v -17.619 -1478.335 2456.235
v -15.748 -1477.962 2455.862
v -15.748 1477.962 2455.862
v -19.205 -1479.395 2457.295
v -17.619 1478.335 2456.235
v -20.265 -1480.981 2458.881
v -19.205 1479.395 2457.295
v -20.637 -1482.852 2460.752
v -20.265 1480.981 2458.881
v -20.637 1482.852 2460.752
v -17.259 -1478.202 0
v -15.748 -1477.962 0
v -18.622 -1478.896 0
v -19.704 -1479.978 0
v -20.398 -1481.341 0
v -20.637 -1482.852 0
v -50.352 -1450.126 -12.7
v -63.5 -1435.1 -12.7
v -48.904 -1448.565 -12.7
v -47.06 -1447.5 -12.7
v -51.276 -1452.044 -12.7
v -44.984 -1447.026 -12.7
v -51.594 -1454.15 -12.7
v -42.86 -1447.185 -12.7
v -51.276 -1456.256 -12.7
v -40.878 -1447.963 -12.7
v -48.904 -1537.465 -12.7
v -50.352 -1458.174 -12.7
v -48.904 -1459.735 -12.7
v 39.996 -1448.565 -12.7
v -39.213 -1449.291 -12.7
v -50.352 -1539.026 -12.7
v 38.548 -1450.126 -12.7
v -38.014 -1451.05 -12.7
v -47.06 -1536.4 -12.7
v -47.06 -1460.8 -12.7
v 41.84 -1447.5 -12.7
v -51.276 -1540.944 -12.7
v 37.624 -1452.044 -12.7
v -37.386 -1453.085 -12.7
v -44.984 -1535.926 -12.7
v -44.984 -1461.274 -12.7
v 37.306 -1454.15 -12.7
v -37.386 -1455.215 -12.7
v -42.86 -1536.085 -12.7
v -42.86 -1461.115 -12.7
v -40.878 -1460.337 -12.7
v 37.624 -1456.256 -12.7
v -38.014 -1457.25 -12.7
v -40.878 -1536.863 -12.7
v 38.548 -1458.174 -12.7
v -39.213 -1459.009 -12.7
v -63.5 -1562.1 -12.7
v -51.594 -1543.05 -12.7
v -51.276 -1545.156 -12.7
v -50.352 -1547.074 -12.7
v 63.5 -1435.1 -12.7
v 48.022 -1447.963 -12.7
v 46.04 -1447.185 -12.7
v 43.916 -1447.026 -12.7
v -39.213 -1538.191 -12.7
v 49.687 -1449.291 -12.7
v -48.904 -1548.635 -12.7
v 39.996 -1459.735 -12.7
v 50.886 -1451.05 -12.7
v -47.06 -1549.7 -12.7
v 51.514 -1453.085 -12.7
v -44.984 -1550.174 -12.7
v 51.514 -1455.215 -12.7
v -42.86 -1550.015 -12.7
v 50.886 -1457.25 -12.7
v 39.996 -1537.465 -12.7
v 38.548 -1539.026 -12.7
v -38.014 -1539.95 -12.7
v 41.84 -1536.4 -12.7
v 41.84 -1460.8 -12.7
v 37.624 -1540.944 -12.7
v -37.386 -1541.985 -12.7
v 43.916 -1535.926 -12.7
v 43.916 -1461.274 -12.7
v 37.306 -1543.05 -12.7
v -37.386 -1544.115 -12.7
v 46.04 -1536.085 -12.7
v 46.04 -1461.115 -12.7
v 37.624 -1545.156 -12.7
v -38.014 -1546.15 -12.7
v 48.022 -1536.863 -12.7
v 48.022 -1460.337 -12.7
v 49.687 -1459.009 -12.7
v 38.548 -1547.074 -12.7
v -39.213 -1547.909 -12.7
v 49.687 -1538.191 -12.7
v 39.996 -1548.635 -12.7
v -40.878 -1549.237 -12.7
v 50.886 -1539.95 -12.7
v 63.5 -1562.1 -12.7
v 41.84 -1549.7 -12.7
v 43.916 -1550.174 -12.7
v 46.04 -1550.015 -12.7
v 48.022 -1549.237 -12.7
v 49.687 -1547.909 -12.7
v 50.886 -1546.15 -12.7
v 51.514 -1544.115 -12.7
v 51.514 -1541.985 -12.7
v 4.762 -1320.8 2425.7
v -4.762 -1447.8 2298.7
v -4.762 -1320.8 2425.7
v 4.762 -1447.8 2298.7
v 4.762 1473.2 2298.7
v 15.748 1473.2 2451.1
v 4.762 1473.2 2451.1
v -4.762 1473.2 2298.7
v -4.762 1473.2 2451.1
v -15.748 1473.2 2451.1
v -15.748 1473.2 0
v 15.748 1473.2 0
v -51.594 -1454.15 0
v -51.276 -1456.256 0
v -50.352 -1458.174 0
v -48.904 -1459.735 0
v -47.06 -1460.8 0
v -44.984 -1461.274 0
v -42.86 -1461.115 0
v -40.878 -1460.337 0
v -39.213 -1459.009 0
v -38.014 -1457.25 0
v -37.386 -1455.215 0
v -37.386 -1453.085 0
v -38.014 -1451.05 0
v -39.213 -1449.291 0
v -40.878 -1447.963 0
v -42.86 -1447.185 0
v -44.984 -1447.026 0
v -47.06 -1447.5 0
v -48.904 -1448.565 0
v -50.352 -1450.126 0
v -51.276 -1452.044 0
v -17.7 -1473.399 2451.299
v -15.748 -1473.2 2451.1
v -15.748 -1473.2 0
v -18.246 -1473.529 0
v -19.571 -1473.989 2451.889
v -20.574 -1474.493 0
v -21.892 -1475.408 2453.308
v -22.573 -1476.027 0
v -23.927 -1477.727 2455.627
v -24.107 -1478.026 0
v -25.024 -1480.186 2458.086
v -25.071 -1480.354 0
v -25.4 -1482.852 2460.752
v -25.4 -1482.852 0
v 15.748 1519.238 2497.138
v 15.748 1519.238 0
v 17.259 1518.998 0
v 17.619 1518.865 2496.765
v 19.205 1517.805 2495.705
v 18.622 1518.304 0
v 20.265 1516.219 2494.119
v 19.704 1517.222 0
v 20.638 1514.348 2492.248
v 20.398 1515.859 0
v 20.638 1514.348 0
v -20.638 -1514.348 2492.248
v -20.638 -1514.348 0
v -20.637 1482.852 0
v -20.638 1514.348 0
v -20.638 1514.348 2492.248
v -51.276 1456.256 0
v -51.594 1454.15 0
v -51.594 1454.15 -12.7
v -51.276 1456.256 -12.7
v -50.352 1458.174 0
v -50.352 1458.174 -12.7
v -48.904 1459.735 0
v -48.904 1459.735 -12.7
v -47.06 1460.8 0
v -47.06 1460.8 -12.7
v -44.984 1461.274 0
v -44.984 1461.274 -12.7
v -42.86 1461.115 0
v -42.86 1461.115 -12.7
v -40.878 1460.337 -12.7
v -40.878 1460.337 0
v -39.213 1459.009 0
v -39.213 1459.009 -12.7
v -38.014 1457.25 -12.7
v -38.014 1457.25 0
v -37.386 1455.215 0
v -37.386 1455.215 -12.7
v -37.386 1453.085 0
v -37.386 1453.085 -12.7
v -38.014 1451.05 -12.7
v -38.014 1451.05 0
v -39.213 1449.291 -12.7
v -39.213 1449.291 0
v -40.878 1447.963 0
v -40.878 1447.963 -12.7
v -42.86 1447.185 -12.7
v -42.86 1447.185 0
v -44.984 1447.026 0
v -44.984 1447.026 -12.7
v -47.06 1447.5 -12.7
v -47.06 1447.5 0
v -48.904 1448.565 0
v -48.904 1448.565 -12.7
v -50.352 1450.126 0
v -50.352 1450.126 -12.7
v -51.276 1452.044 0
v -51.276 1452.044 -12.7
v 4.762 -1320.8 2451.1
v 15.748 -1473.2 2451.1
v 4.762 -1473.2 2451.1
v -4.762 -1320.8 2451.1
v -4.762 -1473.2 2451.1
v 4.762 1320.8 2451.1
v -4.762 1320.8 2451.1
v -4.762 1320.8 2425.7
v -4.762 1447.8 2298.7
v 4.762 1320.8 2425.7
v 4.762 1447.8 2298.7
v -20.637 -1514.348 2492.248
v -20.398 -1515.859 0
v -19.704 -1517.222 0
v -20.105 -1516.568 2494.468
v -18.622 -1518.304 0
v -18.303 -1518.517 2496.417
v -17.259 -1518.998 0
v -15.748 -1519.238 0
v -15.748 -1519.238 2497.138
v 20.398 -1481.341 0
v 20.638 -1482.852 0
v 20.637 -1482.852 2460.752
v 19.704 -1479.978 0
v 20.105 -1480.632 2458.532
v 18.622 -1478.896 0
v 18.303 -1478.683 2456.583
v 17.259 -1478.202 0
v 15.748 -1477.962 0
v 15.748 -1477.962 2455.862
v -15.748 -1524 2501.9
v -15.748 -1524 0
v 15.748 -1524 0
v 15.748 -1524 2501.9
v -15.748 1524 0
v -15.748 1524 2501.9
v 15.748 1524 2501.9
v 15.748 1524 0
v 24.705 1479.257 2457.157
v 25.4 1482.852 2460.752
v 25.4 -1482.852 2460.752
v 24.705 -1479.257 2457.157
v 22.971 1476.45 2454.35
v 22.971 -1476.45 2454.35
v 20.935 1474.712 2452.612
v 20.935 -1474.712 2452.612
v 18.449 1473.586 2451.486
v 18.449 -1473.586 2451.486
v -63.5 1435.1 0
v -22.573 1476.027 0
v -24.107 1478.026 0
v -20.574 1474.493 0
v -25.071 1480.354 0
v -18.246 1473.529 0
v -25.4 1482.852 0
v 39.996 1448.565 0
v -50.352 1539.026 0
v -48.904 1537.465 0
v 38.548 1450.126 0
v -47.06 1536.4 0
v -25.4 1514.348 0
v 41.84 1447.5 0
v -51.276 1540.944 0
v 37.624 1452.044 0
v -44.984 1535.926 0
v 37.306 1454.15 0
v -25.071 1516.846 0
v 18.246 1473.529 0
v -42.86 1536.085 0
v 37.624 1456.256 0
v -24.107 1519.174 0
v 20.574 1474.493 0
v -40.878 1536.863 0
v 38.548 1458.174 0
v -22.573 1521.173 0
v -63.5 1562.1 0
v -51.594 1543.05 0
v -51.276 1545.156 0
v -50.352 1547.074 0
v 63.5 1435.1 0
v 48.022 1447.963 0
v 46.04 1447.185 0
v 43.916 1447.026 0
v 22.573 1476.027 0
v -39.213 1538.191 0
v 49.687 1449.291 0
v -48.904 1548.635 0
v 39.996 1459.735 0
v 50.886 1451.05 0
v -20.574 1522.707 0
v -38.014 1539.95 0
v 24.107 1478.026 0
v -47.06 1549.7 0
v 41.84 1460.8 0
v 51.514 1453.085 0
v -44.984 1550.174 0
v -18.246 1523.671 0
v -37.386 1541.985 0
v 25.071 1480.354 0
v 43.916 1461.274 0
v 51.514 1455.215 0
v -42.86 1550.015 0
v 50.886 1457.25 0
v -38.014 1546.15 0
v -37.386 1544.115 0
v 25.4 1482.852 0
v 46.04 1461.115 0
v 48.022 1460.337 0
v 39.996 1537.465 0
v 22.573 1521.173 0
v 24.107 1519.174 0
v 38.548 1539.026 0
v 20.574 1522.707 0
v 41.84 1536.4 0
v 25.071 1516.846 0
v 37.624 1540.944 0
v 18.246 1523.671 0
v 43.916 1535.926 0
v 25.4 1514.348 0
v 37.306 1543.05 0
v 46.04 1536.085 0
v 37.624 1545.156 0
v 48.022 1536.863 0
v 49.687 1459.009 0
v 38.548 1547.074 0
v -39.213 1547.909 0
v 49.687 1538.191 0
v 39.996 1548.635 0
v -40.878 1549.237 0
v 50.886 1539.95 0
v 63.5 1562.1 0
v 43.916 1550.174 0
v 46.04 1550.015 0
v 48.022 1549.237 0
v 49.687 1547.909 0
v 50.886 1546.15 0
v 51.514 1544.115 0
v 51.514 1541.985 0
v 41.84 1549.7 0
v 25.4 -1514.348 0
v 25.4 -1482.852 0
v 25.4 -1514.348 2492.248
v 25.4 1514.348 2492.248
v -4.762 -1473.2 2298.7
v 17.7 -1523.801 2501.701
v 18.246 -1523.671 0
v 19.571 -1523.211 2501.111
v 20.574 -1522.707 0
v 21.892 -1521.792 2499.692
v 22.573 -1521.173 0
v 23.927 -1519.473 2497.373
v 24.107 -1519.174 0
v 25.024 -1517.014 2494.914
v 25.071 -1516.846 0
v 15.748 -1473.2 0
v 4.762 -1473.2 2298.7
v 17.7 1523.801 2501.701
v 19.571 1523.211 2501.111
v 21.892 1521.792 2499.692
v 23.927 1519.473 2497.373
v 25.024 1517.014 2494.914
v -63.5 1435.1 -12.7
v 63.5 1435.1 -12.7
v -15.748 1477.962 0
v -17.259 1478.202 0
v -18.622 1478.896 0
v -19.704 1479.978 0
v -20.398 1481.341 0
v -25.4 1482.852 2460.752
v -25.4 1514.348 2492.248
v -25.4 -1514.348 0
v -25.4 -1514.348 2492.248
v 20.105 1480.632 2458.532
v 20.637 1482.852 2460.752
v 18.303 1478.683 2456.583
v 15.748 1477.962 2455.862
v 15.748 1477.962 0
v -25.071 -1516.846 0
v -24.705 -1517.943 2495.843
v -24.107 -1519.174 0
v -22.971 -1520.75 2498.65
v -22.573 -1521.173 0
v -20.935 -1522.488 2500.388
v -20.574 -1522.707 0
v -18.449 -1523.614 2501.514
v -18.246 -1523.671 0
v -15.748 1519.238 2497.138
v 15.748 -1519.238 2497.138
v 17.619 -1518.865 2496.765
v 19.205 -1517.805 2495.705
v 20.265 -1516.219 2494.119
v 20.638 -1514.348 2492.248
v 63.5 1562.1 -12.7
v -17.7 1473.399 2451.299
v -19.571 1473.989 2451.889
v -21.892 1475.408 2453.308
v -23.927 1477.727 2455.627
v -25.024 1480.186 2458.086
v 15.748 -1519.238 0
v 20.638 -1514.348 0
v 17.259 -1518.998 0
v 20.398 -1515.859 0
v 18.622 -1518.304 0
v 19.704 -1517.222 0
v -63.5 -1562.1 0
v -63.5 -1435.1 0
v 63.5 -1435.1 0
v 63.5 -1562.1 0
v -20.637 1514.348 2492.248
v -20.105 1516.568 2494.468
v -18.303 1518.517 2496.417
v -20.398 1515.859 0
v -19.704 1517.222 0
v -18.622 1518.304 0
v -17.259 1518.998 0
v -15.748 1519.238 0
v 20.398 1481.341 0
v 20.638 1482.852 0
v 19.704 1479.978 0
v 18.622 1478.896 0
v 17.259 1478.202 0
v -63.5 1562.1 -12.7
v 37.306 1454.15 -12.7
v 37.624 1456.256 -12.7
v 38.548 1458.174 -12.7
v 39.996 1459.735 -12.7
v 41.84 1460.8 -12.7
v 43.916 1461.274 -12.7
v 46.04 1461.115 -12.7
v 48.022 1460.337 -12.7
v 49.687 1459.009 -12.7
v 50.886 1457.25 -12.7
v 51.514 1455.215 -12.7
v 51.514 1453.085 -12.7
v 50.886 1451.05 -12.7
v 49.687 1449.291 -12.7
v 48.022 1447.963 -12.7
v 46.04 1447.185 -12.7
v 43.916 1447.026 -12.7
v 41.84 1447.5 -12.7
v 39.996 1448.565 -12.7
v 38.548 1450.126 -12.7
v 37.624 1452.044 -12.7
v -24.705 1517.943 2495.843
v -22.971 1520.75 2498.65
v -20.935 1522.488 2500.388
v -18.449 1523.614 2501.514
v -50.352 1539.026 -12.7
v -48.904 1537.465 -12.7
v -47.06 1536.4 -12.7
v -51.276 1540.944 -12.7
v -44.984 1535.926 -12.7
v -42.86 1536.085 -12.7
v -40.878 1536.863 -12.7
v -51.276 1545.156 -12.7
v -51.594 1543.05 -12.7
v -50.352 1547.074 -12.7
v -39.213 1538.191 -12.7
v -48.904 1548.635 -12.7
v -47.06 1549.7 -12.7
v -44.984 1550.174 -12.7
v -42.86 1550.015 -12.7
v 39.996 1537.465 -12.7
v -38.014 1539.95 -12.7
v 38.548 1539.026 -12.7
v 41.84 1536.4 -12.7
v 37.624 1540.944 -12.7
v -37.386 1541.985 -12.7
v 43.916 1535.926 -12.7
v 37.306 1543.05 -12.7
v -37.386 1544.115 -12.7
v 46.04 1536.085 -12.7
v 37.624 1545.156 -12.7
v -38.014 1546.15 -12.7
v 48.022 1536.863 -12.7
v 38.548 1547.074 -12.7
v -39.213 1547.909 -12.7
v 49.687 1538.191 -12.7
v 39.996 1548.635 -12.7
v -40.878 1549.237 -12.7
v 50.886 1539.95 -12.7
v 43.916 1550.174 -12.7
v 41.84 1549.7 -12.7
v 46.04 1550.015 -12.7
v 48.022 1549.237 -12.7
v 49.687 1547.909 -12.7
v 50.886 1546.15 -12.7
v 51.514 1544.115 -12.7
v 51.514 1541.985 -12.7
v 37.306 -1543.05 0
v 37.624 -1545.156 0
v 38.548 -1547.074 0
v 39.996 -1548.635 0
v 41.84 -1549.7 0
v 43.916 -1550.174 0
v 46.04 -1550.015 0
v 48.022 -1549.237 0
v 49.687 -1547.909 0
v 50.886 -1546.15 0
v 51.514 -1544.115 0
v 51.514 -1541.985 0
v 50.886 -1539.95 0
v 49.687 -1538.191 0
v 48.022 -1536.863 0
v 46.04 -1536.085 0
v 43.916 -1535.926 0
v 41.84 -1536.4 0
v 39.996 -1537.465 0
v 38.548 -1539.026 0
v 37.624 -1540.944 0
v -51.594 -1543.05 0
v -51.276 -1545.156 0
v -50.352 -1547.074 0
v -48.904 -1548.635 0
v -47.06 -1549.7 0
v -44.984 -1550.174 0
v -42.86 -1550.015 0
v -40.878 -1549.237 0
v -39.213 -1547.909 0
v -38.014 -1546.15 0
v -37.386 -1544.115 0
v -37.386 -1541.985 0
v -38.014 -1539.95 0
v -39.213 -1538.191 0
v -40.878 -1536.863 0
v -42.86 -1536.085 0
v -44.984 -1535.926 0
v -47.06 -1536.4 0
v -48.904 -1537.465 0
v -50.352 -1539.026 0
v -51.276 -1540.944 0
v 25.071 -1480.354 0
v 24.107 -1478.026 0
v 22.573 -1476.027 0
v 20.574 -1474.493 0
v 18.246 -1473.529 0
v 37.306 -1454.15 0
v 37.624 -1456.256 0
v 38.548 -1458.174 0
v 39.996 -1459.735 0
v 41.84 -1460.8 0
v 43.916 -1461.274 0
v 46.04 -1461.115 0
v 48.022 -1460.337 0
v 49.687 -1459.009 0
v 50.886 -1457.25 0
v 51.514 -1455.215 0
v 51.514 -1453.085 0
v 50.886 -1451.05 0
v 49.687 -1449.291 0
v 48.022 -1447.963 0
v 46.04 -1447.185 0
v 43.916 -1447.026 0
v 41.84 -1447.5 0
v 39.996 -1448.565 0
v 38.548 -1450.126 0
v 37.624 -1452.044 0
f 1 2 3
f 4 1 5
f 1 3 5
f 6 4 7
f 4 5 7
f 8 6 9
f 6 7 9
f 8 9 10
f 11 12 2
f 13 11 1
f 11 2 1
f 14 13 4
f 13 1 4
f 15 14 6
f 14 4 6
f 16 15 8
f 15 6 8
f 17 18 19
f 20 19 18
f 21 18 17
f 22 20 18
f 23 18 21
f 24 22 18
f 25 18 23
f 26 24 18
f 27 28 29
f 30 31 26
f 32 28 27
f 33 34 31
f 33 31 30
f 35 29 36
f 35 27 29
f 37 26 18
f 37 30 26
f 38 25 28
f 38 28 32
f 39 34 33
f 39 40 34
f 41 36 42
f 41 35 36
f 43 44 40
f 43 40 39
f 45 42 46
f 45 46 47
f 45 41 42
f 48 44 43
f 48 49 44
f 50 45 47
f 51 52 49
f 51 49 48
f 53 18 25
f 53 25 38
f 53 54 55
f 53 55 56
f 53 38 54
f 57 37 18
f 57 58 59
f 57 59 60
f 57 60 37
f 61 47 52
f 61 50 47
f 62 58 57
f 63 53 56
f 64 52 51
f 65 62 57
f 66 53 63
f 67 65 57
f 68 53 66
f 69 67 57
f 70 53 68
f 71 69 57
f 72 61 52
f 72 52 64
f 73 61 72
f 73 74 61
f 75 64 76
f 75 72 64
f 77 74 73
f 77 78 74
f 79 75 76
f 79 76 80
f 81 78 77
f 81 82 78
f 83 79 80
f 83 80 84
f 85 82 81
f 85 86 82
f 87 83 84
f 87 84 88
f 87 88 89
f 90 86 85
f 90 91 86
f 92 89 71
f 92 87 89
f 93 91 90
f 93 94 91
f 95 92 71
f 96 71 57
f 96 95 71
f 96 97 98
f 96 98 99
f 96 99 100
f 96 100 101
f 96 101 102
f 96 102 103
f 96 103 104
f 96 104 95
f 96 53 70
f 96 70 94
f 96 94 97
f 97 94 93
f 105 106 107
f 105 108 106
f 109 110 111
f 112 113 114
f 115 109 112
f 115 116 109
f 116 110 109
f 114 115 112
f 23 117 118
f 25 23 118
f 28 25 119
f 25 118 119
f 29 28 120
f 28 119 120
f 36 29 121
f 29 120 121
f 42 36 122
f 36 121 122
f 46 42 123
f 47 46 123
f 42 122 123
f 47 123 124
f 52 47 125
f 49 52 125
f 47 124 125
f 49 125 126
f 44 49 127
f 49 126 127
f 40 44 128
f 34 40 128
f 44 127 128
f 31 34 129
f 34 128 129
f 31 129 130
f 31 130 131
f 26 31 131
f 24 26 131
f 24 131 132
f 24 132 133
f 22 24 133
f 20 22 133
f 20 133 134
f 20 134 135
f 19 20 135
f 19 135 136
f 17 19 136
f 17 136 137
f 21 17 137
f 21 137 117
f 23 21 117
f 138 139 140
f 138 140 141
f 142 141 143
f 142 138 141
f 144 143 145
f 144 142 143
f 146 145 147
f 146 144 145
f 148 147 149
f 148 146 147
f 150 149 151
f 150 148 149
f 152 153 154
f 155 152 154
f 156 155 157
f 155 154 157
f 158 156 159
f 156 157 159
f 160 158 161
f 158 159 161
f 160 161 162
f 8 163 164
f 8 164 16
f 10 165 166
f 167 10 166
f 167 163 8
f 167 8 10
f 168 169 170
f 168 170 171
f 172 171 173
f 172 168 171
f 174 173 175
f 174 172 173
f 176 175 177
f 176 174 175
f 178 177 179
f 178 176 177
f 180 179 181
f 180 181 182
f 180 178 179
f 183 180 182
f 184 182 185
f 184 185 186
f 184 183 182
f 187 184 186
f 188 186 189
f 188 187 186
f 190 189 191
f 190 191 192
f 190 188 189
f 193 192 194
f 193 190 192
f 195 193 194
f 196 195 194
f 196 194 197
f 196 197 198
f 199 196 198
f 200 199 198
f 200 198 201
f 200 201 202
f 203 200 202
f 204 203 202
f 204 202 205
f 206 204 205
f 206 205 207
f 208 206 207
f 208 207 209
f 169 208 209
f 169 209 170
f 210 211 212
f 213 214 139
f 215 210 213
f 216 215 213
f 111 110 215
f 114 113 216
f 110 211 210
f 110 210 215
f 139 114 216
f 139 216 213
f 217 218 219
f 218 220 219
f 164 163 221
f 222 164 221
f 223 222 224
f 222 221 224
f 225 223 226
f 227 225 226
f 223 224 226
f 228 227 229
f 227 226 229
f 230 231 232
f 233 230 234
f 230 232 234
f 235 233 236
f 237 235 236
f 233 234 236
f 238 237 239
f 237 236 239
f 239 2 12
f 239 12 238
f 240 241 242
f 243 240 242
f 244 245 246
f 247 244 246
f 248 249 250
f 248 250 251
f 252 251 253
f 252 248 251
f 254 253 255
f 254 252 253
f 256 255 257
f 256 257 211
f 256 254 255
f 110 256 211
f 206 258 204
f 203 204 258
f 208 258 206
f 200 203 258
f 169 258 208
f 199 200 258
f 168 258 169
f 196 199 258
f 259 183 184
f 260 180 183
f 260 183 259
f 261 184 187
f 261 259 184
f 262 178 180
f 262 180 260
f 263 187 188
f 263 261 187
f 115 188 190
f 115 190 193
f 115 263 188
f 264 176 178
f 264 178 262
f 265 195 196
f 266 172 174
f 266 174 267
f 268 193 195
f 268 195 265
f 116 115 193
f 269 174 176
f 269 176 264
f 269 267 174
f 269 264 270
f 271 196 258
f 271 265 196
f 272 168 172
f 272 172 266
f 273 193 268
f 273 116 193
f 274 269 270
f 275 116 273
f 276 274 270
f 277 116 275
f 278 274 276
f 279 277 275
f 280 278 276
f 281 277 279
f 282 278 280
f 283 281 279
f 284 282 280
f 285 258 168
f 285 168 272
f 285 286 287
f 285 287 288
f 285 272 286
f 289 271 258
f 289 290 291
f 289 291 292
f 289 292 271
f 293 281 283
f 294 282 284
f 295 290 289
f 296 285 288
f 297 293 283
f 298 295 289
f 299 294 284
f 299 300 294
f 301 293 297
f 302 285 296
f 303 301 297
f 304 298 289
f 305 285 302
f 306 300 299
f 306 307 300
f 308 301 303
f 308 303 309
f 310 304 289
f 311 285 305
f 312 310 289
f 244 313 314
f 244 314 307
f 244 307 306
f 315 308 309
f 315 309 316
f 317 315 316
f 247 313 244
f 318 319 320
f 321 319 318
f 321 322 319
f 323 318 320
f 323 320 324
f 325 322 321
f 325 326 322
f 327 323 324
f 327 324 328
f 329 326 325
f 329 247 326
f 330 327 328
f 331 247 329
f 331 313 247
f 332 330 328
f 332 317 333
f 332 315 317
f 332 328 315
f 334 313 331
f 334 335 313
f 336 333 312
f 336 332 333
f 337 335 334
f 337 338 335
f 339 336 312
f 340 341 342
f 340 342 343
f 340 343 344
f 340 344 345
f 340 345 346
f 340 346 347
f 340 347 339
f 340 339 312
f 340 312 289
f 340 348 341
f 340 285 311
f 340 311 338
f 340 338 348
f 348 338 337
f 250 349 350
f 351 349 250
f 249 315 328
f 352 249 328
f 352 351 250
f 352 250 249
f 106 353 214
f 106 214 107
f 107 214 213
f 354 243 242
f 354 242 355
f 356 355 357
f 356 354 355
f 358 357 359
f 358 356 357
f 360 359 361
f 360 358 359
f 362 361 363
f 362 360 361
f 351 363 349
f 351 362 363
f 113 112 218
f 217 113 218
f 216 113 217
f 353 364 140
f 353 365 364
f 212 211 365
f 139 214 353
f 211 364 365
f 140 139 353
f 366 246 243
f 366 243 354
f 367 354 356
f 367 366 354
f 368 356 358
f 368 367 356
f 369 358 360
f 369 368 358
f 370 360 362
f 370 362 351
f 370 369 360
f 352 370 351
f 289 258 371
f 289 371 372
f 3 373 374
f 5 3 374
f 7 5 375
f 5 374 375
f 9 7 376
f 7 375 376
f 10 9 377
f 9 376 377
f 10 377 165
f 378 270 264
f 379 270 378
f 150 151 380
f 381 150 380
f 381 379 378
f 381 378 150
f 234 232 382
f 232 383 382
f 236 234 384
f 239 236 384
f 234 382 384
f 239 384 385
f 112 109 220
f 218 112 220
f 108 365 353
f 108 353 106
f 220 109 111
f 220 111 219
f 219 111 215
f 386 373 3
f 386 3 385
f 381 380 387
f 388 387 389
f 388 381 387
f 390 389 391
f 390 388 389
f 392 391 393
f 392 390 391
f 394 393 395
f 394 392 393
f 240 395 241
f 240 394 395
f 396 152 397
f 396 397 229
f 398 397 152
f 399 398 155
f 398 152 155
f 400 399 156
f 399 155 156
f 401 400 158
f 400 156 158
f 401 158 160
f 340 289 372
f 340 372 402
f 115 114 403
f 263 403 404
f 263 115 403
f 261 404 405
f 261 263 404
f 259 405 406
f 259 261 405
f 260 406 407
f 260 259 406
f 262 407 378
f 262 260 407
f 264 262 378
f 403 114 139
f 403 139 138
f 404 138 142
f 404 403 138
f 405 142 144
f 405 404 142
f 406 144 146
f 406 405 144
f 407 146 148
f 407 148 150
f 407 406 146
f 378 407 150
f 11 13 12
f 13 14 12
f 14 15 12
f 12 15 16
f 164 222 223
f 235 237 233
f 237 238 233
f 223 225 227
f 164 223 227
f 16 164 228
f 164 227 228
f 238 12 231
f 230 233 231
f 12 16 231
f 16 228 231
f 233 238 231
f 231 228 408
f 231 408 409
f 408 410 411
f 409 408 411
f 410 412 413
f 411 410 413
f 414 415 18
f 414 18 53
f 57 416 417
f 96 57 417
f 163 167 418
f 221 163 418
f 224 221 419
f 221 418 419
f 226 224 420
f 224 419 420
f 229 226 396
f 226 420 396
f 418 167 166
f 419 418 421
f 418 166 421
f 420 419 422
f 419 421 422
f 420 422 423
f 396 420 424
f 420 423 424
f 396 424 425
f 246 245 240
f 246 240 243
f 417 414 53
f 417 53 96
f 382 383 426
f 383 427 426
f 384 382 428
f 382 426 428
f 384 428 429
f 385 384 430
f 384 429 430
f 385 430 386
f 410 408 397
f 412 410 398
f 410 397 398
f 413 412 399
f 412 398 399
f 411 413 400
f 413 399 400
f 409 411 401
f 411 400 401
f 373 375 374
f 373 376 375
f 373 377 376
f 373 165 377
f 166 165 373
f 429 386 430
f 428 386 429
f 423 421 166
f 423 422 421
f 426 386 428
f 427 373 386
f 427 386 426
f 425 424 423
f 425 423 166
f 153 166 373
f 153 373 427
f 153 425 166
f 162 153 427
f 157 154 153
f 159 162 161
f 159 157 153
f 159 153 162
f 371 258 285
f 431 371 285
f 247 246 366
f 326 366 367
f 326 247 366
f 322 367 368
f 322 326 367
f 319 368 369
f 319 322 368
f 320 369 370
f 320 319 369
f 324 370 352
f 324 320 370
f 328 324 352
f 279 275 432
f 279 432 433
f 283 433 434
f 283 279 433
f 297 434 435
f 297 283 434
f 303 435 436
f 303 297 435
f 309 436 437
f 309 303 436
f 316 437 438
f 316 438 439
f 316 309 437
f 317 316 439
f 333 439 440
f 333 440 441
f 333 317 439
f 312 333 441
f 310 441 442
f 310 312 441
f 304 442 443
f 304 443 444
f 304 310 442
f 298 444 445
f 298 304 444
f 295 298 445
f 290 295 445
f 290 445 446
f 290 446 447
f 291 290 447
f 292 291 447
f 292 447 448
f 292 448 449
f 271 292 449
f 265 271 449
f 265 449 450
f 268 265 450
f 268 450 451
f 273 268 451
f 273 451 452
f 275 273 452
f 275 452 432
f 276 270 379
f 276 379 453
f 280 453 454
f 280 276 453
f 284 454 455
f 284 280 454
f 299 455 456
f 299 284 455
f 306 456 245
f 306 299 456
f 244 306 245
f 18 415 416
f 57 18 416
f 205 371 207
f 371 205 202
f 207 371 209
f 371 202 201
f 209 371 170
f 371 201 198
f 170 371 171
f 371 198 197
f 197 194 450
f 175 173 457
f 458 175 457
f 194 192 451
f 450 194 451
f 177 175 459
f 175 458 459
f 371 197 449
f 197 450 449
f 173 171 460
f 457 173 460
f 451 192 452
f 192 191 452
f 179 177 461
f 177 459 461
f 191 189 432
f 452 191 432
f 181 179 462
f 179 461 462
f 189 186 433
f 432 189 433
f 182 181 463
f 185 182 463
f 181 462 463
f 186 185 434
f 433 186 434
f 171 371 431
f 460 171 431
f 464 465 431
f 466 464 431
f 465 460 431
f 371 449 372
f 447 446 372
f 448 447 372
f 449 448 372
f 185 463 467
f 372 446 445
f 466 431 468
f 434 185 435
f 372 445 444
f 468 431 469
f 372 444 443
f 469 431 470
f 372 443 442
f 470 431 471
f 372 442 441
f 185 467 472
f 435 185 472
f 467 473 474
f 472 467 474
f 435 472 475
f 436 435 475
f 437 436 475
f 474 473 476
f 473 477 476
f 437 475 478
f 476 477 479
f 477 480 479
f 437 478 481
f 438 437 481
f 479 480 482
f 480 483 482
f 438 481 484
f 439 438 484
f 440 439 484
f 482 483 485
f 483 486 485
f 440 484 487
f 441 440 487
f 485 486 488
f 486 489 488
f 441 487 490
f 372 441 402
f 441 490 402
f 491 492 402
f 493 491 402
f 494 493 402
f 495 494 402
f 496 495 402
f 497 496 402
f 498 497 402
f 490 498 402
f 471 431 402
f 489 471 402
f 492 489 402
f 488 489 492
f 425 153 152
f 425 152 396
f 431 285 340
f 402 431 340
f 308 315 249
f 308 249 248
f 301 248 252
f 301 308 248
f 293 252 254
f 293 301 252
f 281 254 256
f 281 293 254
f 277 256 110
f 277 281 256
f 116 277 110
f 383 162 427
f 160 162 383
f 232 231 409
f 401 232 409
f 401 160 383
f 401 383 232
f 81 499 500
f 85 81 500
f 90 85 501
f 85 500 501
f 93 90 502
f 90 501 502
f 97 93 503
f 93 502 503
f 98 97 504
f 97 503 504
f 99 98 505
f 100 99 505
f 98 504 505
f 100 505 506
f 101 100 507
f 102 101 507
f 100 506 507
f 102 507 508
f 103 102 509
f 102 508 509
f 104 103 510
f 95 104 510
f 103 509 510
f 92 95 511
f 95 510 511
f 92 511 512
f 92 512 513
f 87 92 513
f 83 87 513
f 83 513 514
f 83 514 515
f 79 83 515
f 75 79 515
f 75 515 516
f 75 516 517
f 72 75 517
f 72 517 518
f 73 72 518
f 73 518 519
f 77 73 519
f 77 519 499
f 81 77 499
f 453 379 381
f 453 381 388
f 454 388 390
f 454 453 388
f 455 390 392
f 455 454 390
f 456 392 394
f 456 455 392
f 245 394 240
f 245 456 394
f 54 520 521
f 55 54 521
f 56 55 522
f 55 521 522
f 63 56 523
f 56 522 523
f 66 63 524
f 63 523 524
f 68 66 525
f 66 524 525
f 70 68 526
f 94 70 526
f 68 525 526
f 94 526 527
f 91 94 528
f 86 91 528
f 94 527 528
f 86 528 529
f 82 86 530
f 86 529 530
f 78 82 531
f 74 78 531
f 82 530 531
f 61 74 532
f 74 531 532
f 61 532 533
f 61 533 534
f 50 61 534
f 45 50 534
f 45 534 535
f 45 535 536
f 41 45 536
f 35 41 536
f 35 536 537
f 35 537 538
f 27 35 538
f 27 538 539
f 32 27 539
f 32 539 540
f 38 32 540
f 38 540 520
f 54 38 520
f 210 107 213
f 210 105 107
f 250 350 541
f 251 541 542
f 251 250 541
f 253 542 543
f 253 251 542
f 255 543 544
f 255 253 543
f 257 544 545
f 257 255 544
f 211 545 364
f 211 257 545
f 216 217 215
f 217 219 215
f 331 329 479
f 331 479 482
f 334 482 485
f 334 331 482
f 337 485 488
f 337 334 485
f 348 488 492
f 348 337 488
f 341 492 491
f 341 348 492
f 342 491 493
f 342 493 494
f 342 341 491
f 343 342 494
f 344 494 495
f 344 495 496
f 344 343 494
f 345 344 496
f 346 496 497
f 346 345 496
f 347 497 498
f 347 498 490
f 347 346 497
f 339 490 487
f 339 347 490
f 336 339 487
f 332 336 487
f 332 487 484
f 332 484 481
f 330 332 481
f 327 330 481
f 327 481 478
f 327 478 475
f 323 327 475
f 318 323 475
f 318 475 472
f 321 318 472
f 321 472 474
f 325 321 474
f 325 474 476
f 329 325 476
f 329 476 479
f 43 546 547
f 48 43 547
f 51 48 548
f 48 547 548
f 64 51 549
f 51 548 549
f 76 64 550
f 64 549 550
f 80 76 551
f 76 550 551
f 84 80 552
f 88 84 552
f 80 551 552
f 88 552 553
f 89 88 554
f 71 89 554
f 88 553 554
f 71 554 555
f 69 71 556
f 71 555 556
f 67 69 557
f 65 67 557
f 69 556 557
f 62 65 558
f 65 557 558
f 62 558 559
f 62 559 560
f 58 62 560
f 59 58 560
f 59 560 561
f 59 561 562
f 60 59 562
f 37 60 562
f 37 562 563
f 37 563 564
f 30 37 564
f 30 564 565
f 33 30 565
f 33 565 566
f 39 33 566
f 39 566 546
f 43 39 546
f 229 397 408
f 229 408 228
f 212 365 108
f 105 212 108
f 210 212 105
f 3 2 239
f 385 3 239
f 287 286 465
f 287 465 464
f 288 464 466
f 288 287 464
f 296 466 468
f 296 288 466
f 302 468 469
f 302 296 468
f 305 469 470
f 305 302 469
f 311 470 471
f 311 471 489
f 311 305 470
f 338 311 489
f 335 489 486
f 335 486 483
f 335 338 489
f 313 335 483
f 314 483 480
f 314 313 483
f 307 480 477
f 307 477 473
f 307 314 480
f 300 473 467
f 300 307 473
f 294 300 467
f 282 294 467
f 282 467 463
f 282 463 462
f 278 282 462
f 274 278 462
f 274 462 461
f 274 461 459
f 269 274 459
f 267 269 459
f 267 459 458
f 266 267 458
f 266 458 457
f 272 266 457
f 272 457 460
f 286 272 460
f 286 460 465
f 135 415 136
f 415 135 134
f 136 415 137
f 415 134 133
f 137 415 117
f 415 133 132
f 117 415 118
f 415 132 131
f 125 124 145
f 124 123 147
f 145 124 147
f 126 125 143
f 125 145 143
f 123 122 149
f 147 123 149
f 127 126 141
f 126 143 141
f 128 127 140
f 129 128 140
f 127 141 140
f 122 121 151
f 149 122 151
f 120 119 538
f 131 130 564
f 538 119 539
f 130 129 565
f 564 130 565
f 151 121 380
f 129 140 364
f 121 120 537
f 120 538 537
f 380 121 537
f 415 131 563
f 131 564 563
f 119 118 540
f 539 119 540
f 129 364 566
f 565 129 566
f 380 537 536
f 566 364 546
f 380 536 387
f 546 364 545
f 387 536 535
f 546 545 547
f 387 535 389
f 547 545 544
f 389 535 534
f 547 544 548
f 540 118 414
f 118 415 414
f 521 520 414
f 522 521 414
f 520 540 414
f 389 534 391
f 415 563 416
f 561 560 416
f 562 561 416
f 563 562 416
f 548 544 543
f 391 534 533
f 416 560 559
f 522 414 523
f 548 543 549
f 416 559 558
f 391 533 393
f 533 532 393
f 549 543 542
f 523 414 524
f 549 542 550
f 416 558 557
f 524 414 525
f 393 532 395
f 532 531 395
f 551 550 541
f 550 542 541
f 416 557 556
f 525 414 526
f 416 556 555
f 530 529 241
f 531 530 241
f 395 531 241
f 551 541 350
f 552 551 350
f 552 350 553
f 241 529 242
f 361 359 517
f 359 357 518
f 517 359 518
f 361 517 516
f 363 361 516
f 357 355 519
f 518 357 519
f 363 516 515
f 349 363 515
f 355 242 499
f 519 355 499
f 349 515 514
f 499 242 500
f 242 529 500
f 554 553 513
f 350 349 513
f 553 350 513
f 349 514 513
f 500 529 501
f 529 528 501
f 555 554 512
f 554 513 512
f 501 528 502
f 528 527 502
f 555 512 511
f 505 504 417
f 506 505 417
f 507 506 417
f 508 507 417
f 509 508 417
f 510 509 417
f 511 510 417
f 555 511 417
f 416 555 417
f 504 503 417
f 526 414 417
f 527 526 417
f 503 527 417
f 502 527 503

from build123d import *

# Parameters (mm, degrees)
F3_W      = 127
F3_H      = 127
F4_DEPTH  = 12.7
F6_D      = 14.2875
F10_DEPTH = 4.7625


# Not quite as in the source:
# - a length typed as a fraction of an inch, garbled in the dataset ("3 / 203.2 mm" for 3/8 in), is restored
# - a feature names something its author has since deleted; it is built from what else it names


with BuildPart() as f2:
    # F2: sweep along a path in F0
    with BuildLine(Plane.YZ) as f2_path:
        Line((-1524, 0), (-1524, 2501.9))
        Line((-1524, 2501.9), (1524, 2501.9))
        Line((1524, 2501.9), (1524, 0))
    # F1 (on Top) → F2 (sweep)
    with BuildSketch(Plane.XY):
        with BuildLine():
            Line((-15.748, -1524), (0, -1524))
            Line((0, -1524), (15.748, -1524))
            ThreePointArc((15.748, -1524), (22.572994652, -1521.172994652), (25.4, -1514.348))
            Line((25.4, -1514.348), (25.4, -1482.852))
            ThreePointArc((25.4, -1482.852), (22.572994652, -1476.027005348), (15.748, -1473.2))
            Line((15.748, -1473.2), (-15.748, -1473.2))
            ThreePointArc((-15.748, -1473.2), (-22.572994652, -1476.027005348), (-25.4, -1482.852))
            Line((-25.4, -1482.852), (-25.4, -1514.348))
            ThreePointArc((-25.4, -1514.348), (-22.572994652, -1521.172994652), (-15.748, -1524))
        make_face()
        with BuildLine():
            Line((0, -1519.2375), (-15.748, -1519.2375))
            ThreePointArc((-15.748, -1519.2375), (-19.2053986066, -1517.8053986066), (-20.6375, -1514.348))
            Line((-20.6375, -1514.348), (-20.6375, -1482.852))
            ThreePointArc((-20.6375, -1482.852), (-19.2053986066, -1479.3946013934), (-15.748, -1477.9625))
            Line((-15.748, -1477.9625), (15.748, -1477.9625))
            ThreePointArc((15.748, -1477.9625), (19.2053986066, -1479.3946013934), (20.6375, -1482.852))
            Line((20.6375, -1482.852), (20.6375, -1514.348))
            ThreePointArc((20.6375, -1514.348), (19.2053986066, -1517.8053986066), (15.748, -1519.2375))
            Line((15.748, -1519.2375), (0, -1519.2375))
        make_face(mode=Mode.SUBTRACT)
    sweep(path=f2_path.line, transition=Transition.RIGHT)

    # F3 (on face) → F4 (join)
    with BuildSketch(Plane(origin=(0, 0, 0), x_dir=(1, 0, 0), z_dir=(0, 0, -1))):
        with Locations((0, 1498.6)):
            Rectangle(F3_W, F3_H)
    extrude(amount=F4_DEPTH)

    # F6 (through all)
    with Locations(Plane(origin=(0, 0, -12.7), x_dir=(1, 0, 0), z_dir=(0, 0, -1))):
        with Locations((-44.45, 1454.15), (-44.45, 1543.05), (44.45, 1543.05), (44.45, 1454.15)):
            Hole(F6_D / 2)


with BuildPart() as f7_1:
    # F7: instance of F2
    add(f2.part.mirror(Plane.XZ))


with BuildPart() as f2_1:
    add(f2.part)

    add(f7_1.part)  # F10 merges F7_1
    # F9 (on mid) → F10 (join, symmetric)
    with BuildSketch(Plane.YZ):
        Polygon((-1320.8, 2451.1), (-1473.2, 2451.1), (-1473.2, 2298.7), (-1447.8, 2298.7), (-1320.8, 2425.7), align=None)
    extrude(amount=F10_DEPTH, both=True)

    # F11: F2 across plane


with BuildPart() as f2_2:
    add(f2_1.part)
    add(f2_1.part.mirror(Plane.XZ))


solid = f2_2.part
